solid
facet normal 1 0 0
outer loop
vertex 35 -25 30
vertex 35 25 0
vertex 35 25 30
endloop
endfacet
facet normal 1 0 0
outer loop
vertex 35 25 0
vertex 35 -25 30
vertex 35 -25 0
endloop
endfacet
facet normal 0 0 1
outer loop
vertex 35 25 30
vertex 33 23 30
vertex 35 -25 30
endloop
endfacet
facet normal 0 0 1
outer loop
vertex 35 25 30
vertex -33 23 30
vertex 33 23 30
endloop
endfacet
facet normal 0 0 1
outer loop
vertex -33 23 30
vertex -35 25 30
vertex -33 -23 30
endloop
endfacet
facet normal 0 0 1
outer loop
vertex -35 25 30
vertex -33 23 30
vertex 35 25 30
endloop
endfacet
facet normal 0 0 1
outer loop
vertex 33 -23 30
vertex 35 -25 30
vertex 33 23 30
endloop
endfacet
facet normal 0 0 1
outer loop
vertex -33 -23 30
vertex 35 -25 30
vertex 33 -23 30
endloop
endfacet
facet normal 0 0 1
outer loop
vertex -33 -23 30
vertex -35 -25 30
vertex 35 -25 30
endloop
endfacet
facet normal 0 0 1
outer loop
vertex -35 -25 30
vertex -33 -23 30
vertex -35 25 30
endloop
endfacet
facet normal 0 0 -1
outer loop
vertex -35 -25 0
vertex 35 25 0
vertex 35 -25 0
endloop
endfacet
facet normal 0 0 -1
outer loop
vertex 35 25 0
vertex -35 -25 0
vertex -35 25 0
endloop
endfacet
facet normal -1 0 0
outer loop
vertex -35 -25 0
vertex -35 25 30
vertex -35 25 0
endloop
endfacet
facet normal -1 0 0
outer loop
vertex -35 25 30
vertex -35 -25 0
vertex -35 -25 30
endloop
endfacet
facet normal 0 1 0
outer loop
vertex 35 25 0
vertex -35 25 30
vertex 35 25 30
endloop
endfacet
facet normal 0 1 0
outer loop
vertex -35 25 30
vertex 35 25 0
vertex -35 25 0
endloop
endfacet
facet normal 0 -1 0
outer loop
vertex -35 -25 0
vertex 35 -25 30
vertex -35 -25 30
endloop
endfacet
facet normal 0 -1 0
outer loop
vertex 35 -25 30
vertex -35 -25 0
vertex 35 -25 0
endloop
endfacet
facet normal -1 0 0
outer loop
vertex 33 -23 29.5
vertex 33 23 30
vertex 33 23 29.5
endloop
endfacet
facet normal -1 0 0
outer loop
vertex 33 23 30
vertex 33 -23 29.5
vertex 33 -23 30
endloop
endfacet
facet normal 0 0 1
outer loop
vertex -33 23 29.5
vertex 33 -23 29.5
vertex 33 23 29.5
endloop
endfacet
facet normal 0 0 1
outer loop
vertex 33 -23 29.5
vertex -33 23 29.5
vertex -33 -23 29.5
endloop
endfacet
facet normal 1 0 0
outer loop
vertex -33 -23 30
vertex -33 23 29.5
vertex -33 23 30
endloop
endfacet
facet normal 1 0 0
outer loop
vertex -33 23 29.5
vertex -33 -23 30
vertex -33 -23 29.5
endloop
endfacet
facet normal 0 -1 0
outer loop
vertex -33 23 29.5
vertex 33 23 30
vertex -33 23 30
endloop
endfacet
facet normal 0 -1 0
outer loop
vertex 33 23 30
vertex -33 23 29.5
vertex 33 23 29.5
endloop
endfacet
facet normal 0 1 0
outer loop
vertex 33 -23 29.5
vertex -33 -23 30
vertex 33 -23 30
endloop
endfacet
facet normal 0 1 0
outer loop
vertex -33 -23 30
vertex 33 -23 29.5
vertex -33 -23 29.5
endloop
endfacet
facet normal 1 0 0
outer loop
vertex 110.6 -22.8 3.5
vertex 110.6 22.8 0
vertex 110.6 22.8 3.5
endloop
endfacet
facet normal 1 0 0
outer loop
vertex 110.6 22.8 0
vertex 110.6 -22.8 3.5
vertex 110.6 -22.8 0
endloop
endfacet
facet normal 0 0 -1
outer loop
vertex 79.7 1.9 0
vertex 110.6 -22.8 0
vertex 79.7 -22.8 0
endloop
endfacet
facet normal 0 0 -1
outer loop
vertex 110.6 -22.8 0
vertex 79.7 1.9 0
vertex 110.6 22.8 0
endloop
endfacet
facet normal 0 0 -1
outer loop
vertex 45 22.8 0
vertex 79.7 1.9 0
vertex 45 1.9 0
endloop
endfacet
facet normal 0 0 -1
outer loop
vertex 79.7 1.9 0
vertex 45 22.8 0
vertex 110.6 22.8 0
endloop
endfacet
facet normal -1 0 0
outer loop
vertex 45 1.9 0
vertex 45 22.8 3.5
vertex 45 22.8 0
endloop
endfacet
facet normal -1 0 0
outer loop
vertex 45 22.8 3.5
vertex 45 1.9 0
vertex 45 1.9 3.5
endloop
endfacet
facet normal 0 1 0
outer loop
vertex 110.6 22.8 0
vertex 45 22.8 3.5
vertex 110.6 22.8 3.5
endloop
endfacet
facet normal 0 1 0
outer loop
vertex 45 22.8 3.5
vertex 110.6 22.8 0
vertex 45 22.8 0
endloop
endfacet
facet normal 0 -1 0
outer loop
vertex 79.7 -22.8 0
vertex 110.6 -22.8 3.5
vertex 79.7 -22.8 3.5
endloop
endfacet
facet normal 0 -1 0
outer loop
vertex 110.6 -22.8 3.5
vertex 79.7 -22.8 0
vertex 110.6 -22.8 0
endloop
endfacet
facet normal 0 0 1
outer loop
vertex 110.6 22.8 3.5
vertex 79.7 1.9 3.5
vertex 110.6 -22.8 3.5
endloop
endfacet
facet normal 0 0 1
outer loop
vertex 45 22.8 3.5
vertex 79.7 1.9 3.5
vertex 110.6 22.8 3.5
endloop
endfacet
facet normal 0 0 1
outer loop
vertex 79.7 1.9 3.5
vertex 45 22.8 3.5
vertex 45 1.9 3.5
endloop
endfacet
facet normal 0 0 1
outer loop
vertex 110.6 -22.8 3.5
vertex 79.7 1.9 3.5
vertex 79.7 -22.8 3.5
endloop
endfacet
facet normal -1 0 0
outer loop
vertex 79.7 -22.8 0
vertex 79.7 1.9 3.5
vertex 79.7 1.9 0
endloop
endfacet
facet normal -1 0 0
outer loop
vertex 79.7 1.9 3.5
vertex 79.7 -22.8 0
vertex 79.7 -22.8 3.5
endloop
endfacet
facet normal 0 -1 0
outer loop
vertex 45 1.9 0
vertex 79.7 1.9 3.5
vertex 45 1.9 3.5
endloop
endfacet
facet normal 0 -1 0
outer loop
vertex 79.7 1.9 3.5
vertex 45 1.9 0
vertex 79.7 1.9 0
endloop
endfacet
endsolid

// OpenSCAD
// Two-part enclosure for a small electronics board (e.g. Arduino-based temperature logger)
// Print orientation: both parts on the bed, side by side, with a 10 mm gap between them.
// The box is open-topped; the lid is printed upside down and slides into the box opening.
// Units: mm. No external libraries.

// ---------------- Parameters ----------------
box_x      = 70;    // box outer length (X)
box_y      = 50;    // box outer width (Y)
box_h      = 30;    // box outer height (Z)
wall       = 2;     // box wall thickness
floor      = 2;     // box floor thickness
eps        = 0.5;   // cutter overshoot past faces

lip_t      = 1.5;   // lid wall thickness
lip_h      = 4;     // lid wall height (above the 2 mm plate)
lip_x      = 65.6;  // lid outer length (X)
lip_y      = 45.6;  // lid outer width (Y)
lip_clear  = 0.2;   // clearance between lid and box opening (each side)
gap        = 10;    // gap between the two printed parts

$fn = 64;

// ---------------- Derived ----------------
box_i_x = box_x - 2 * wall;   // inner length (X)
box_i_y = box_y - 2 * wall;   // inner width (Y)
// lid lip height above the bed = plate (2 mm) + wall (1.5 mm) + extra (4 mm)
lip_total_h = 2 + lip_t + lip_h;   // 7.5 mm

// ---------------- Model ----------------
union() {
    // Part 1: Box, open top, centred in X/Y, resting on z = 0
    difference() {
        translate([-box_x / 2, -box_y / 2, 0])
            cube([box_x, box_y, box_h]);
        // Open the top: cut a rectangle that extends past the top face
        translate([-box_i_x / 2, -box_i_y / 2, box_h - eps])
            cube([box_i_x, box_i_y, eps + 1]);
    }

    // Part 2: Lid, printed upside down, on the +X side of the box
    translate([box_x / 2 + gap, -lip_y / 2, 0])
        difference() {
            // Plate + lip block
            translate([0, 0, 0])
                cube([lip_x, lip_y, lip_total_h]);
            // Cut a recess so the lip walls stand 4 mm above the bed
            translate([0, 0, lip_total_h - lip_h])
                cube([lip_x, lip_y, lip_h + eps]);
            // Recesses for the box opening, with 0.2 mm clearance on each side
            translate([-lip_x / 2 + eps, -lip_y / 2 + eps, 0])
                cube([box_i_x + 2 * eps, box_i_y + 2 * eps, lip_total_h]);
        }
}
